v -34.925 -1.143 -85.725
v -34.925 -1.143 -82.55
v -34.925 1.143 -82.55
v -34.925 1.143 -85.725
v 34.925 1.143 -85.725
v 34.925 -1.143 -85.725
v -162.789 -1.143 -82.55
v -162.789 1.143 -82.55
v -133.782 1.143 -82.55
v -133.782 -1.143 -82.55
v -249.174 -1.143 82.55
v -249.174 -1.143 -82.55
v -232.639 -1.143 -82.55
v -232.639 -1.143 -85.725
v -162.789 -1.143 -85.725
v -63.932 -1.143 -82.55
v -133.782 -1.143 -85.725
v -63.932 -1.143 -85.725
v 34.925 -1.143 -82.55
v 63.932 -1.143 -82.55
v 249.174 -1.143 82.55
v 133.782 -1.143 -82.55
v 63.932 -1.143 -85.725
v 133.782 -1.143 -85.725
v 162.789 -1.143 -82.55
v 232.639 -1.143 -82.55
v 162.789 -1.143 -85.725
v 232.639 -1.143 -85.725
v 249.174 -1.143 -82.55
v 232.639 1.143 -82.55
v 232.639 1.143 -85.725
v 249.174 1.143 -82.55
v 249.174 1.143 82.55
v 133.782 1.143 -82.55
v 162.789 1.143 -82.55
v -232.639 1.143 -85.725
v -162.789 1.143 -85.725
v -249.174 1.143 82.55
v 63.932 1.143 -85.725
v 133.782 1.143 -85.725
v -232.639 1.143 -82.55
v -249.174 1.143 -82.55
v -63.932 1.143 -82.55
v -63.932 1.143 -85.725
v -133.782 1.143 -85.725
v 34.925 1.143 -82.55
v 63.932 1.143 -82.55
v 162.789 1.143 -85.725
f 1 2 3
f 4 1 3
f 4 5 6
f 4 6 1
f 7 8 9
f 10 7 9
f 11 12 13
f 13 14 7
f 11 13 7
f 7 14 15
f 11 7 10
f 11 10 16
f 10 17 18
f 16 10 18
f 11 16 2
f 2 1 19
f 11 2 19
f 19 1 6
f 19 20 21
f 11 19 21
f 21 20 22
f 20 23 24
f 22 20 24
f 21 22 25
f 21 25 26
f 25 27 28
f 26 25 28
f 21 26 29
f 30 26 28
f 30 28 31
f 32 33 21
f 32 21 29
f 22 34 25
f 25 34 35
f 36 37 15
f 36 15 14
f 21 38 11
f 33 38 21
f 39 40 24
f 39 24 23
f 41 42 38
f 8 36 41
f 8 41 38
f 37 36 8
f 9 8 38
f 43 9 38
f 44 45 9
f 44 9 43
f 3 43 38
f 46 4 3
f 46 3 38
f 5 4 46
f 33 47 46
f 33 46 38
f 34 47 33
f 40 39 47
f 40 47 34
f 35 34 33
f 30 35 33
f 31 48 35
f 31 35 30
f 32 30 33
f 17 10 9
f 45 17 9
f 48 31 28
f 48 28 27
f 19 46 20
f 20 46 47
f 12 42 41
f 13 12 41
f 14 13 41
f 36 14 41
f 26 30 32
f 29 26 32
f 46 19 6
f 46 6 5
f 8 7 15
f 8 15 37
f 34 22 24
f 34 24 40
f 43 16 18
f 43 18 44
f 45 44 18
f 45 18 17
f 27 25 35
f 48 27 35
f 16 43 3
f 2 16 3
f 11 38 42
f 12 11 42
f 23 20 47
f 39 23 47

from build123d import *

# Parameters (mm, degrees)
SKETCH1_W           = 498.348
SKETCH1_H           = 165.1
BOSS_EXTRUDE1_DEPTH = 1.143
SKETCH2_W           = 69.85
SKETCH2_H           = 2.286
BOSS_EXTRUDE2_DEPTH = 3.175
LPATTERN1_COUNT     = 5
LPATTERN1_PITCH     = 98.8568


with BuildPart() as part:
    # Sketch1 → Boss-Extrude1 (new, symmetric)
    with BuildSketch(Plane(origin=(0, 0, 0), x_dir=(1, 0, 0), z_dir=(0, 1, 0))):
        Rectangle(SKETCH1_W, SKETCH1_H)
    extrude(amount=BOSS_EXTRUDE1_DEPTH, both=True)

    # Sketch2 → Boss-Extrude2 (add)
    with BuildSketch(Plane(origin=(0, 0, -82.55), x_dir=(-1, 0, 0), z_dir=(0, 0, -1))):
        with Locations((-197.7136, 0)):
            Rectangle(SKETCH2_W, SKETCH2_H)
    boss_extrude2 = extrude(amount=BOSS_EXTRUDE2_DEPTH)

    # LPattern1: Boss-Extrude2 ×5
    with Locations(*[(-i * LPATTERN1_PITCH, 0, 0) for i in range(1, LPATTERN1_COUNT)]):
        add(boss_extrude2)


solid = part.part
